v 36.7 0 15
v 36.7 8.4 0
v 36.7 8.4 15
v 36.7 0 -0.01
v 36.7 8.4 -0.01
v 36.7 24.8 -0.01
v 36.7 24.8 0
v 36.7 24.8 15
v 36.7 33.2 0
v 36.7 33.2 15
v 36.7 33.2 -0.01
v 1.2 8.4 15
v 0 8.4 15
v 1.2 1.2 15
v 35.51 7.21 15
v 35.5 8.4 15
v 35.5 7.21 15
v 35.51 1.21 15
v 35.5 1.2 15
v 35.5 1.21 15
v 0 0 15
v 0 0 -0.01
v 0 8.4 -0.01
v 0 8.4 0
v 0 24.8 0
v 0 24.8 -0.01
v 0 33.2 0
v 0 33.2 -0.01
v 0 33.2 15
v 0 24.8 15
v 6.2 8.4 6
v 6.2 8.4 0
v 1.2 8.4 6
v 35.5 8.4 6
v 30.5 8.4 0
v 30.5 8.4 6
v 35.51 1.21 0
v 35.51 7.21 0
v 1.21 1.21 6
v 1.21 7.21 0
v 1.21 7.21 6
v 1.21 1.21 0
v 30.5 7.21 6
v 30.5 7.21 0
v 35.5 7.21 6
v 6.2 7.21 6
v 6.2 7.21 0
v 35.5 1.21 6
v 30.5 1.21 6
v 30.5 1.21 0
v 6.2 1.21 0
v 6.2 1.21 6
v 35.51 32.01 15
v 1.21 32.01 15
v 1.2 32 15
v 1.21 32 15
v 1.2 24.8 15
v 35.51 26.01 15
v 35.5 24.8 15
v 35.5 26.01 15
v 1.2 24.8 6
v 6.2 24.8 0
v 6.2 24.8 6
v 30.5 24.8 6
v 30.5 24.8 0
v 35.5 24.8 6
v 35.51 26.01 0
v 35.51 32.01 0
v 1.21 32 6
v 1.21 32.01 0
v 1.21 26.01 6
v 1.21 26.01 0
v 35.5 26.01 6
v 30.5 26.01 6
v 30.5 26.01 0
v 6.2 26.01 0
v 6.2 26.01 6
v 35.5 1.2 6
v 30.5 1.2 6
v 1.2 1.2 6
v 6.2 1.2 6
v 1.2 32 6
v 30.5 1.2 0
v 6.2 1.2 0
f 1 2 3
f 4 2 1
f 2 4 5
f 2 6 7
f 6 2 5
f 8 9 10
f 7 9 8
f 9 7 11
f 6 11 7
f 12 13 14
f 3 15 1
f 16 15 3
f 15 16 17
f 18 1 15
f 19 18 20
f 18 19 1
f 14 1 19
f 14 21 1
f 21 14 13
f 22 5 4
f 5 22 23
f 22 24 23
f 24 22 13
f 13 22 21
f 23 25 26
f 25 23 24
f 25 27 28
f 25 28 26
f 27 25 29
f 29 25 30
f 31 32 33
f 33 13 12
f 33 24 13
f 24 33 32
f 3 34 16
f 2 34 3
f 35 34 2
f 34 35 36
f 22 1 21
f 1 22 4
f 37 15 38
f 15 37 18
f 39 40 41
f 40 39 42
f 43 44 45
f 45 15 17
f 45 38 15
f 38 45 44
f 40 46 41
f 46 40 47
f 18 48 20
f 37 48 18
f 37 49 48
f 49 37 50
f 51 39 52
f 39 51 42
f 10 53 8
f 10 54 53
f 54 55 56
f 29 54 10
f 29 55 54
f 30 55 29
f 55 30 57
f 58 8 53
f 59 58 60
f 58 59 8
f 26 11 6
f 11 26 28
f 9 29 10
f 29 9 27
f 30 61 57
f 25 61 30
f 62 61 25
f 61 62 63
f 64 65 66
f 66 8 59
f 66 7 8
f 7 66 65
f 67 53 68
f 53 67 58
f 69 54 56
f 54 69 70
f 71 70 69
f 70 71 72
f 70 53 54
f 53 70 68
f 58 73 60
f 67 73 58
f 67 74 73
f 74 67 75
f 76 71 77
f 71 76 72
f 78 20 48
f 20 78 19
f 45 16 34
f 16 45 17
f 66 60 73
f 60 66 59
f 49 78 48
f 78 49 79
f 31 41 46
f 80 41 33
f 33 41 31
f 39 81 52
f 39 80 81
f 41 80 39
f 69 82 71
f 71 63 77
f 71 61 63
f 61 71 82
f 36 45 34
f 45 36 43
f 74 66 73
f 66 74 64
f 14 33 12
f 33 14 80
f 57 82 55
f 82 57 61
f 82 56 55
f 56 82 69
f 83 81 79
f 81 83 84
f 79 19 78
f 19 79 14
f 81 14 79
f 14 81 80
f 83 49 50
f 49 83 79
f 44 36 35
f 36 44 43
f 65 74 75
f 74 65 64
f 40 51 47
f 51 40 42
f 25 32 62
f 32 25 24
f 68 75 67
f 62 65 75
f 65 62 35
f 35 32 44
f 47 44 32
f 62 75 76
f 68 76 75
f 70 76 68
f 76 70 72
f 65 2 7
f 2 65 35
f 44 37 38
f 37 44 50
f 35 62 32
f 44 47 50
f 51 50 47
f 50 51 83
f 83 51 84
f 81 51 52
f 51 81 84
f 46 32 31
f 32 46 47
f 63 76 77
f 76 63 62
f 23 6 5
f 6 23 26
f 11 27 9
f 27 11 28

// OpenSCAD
// file: ../Base/Rotation.scad
// Fischertechnik Box Foundation
// Geometry Helpers Rotation

include <PlacementOptions.scad>

// getRotatedSpace(space, rotation=NoRotation)
// Rotates the space dependent on the specified rotation

function getRotatedSpace(space, rotation=NoRotation) = [
    (rotation == Rotate90 || rotation == Rotate270) ? space.y : space.x,
    (rotation == Rotate90 || rotation == Rotate270) ? space.x : space.y
];

// Rotates the given space around the fixed left lower corner
// space = the space the children needs as width/depth list [width,depth]
// rotation = 0 Rotate0 degrees, 1 Rotate90 degrees, 2 Rotate180 degrees, 3 Rotate270 degrees (equivalent to -90)

module RotateFix(space, rotation=NoRotation) {
    dy = (rotation == Rotate0 || rotation == Rotate270) ? 0 :
        (rotation == Rotate90) ? space.x :
        space.y;
    dx = (rotation < Rotate180) ? 0 :
        (rotation == Rotate180) ? space.x :
        space.y;
    
    translate([dx, dy, 0])
        rotate([0, 0, rotations[rotation]])
            children();
}
// file: ../Base/Alignment.scad
// Fischertechnik Box Foundation
// Geometry Helpers Alignment

include <PlacementOptions.scad>

// getAlignedX(elementWidth, spaceWidth, align=AlignRight, offset=0)
// Gets the aligned X offset of an element with the given
// width in the given space.
// elementWidth = The width of the element to positon
// spaceWidth = The space where the element should be aligned
// align = 0 AlignLeft, 1 AlignCenter, 2 AlignRight
// offset = an optional offset from the aligned position. When
// aligned left or centered, then positive values are in X direction.
// When aligned right then positive values are in negative X direction.

function getAlignedX(elementWidth, spaceWidth, align=AlignRight, offset=0) =
    (align == AlignLeft) ?
        offset :
        ((align == AlignCenter) ?
        (spaceWidth - elementWidth)/2 + offset :
        spaceWidth - offset - elementWidth);

// getAlignedY(elementDepth, spaceDepth, align=AlignTop, offset=0)
// Gets the aligned Y offset of an element with the given
// depth in the given space.
// elementDepth = The depth of the element to positon
// spaceDepth = The space where the element should be aligned
// align = 0 AlignBottom, 1 AlignCenter, 2 AlignTop
// offset = an optional offset from the aligned position. When
// aligned bottom or centered, then positive values are in Y direction.
// When aligned top then positive values are in negative Y direction.

function getAlignedY(elementDepth, spaceDepth, align=AlignTop, offset=0) =
    (align == AlignBottom) ?
        offset :
        ((align == AlignCenter) ?
        (spaceDepth - elementDepth)/2 + offset :
        spaceDepth - offset - elementDepth);
// file: ../Base/PlacementOptions.scad
// Fischertechnik Box Foundation
// Placement Options

// Alignment
NoAlign = 0;
AlignLeft = 1;
AlignBottom = 2;
AlignCenter = 3;
AlignRight = 4;
AlignTop = 5;

// Element rotation degree steps
rotations = [0, -90, -180, -270];

// Rotation
NoRotation = 0;
Rotate0 = 0;
Rotate90 = 1;
Rotate180 = 2;
Rotate270 = 3;

// Docking (seen from above)
NoDock = -1;
DockLeft = 0;
DockTop = 1;
DockRight = 2;
DockCorner = 2;
DockBottom = 3;

// Web corners
LowerLeft = 0;
UpperLeft = 1;
UpperRight = 2;
LowerRight = 3;

// Web position relative to corner
LeftOfCorner = 0;
RightOfCorner = 1;
// file: ../Base/Boxes.scad
// Fischertechnik Box Foundation
// Pre-designed Boxes

use <Constants.scad>

include <PlacementOptions.scad>

box190Width = 190;
box190Depth = 130;
box130Width = 130;
box130Depth = 95;

// Values are from an original ec3 box
topBottomDifference = 1.5;
outerHeight = 40;
baseThickness = 1.8;
innerHeight = outerHeight - baseThickness;
stackExcess = 5.7;
radius = 3.5;
wallThickness = 1.5;
tolerance = 0.2;

boxWallThickness = wallThickness;
boxBaseThickness = baseThickness;
boxWebWidth = 3.0;

// getBoxWallThickness()
// Gets the wall thickness of a Fischertechnik Box
function getBoxWallThickness() = boxWallThickness;

// getBoxUsageHeight(height = 38.2)
// Gets the usable height of a Fischertechnik box
// height = Outer height of the box from the bottom to the upper edge.
function getBoxUsageHeight(height = outerHeight) = height - baseThickness - stackExcess;

// getBoxInnerHeight()
// Gets the inner height of a Fischertechnik box, including the stack excess
function getBoxInnerHeight() = innerHeight;

// getBoxBaseThickness()
// Gets the thickness of the Fischertechnik box base.
function getBoxBaseThickness() = boxBaseThickness;

// getBoxWebWidth()
// Gets the width of a box web
function getBoxWebWidth() = boxWebWidth;

// getBox190Space()
// Gets the usable inner space of a Box 190 as an x/y-list
function getBox190Space() = [
    box190Width - 2*getBoxWallThickness() - topBottomDifference, 
    box190Depth - 2*getBoxWallThickness() - topBottomDifference ];

// RoundedCornerPlate(width, depth, height, radius)
// Creates a body plate with rounded corners for a box. Used
// also to create the complete box with the hull module.
// width = Width of the plate
// depth = depth of the plate 
// height = thickness of the plate
// radius = radius of the rounded corner
module RoundedCornerPlate(width, depth, height, radius) {
    translate([radius, radius])
    hull() {
        w = width-2*radius;
        d = depth-2*radius;
        cube([w, d, height]);
        cylinder(height, r=radius, $fn=getFragments());
        translate([w, 0])
            cylinder(height, r=radius, $fn=getFragments());
        translate([w, d])
            cylinder(height, r=radius, $fn=getFragments());
        translate([0, d])
            cylinder(height, r=radius, $fn=getFragments());
    }
}

// BoxBase(width, depth)
// Creates an empty stackable Fischertechnik compatible box
// width = Outer width of the box (190, 130, ...)
// depth = Outer depth of the box (130, 95, ...)

module BoxBase(width, depth, height=outerHeight) {    
    thinPlate = 0.01;

    innerHeight = height - baseThickness;    
    
    module Body(tolerance=tolerance) {
        hull() {
            // Bottom with tolerance to fit into the original boxes when stacked
            translate([-wallThickness+tolerance, -wallThickness+tolerance, -baseThickness])
                RoundedCornerPlate(width-topBottomDifference-2*tolerance, depth-topBottomDifference-2*tolerance, thinPlate, radius);
            
            // Top
            translate([-wallThickness-topBottomDifference/2, -wallThickness-topBottomDifference/2, innerHeight-thinPlate])
                RoundedCornerPlate(width, depth, thinPlate, radius);
         }
    }

    module Cutoff() {
        hull() {
            coWidth = width - 2*wallThickness;
            coDepth = depth - 2*wallThickness;
            
            // Bottom
            RoundedCornerPlate(coWidth-topBottomDifference, coDepth-topBottomDifference, thinPlate, radius);

            // Top
            translate([-topBottomDifference/2, -topBottomDifference/2, innerHeight+thinPlate]) 
                RoundedCornerPlate(coWidth, coDepth, thinPlate, radius);
        }
    }
    
    difference() {        
        Body();
        Cutoff();
        stackOffset = innerHeight - stackExcess;
        translate([0, 0, stackOffset + baseThickness])
            Body(tolerance=0);
    }
}

// Creates the Fischertechnik empty box 130x190 mm and places it at position 0,0
// 190x130 are the outer sizes, the inner space is slightly smaller. Use getBox190Space() to get the inner sizes.
// The box is positioned that the usable inner space is at the 0,0,0 position.

module Box190() {
    BoxBase(box190Width, box190Depth);
}

// Gets the usable inner space of a Box 130 as an x/y-list
function getBox130Space() = [
    box130Width - 2*getBoxWallThickness() - topBottomDifference, 
    box130Depth - 2*getBoxWallThickness() - topBottomDifference ];

// Creates the Fischertechnik empty box 95x130 mm and places it at position 0,0
// 190x130 are the outer sizes, the inner space is slightly smaller. Use getBox190Space() to get the inner sizes.
// The box is positioned that the usable inner space is at the 0,0,0 position.

module Box130() {
    BoxBase(box130Width, box130Depth);
}

// Creates a web at the specified box walls
// corner 0 = LowerLeft, 1 = UpperLeft, 2 = UpperRight, 3 = LowerRight
// side 0 = LeftOfCorner, 1 = RightOfCorner
// distance = Distance in mm from the corner
// boxSpace = inner width and depth of the box (default: Box 190)
// webWidth = length of the web (default is 3 mms)
// webThickness = thickness of the web (default is 1 mm)
// height = Height of the web (standard is getBoxUsageHeight())
// sink = How much of the web is sunk into the wall

module BoxWeb(
    corner, 
    side, 
    distance, 
    boxSpace=getBox190Space(), 
    webWidth=getBoxWebWidth(), 
    webThickness=1.0, 
    height=getBoxUsageHeight(),
    sink = getBoxWallThickness()/2) {
    width = (corner % 2 == 0) ? 
            (side == LeftOfCorner ? webWidth : webThickness) :
            (side == LeftOfCorner ? webThickness : webWidth);

    depth = (corner % 2 == 0) ? 
            (side == RightOfCorner ? webWidth : webThickness) :
            (side == RightOfCorner ? webThickness : webWidth);
    
    xDiff = corner == LowerLeft ? 
                (side == LeftOfCorner ? -sink : distance) :
            (corner == UpperLeft ?                
                (side == LeftOfCorner ? distance : -sink) :
            (corner == UpperRight ?
                (side == LeftOfCorner ? boxSpace.x-webWidth+sink : boxSpace.x-distance-webThickness) :
                (side == LeftOfCorner ? boxSpace.x-distance-webThickness: boxSpace.x-webWidth+sink)));

    yDiff = corner == LowerLeft ? 
                (side == RightOfCorner ? -sink : distance) :
            (corner == UpperLeft ?
                (side == RightOfCorner ? boxSpace.y-distance-webThickness : boxSpace.y-webWidth+sink) :
            (corner == UpperRight ?
                (side == RightOfCorner ? boxSpace.y-webWidth+sink : boxSpace.y-distance-webThickness) :
                (side == RightOfCorner ? distance : -sink)));
    
    translate([xDiff, yDiff, -getExcess()])
        cube([width, depth, height + 2*getExcess()]);
}
// file: ../Base/Placement.scad
// Fischertechnik Box Foundation
// Geometry Helpers Placement

use <Constants.scad>
use <Alignment.scad>
use <Rotation.scad>
use <Boxes.scad>

include <PlacementOptions.scad>

// Place(x=0, y=0, elementSpace=[0,0], alignX=AlignLeft, alignY=AlignBottom, rotation=Rotate0, boxSpace=getBox190Space())
// Places the child at the specified position
// y = Y-Position. This is a relative position when an X aligment is specified.
// x = X-Position. This is a relative position when an Y aligment is specified.
// elementSpace = space of the element to be placed [x,y]
// alignX = -1=NoAlign, 0 AlignLeft, 1 AlignCenter, 3 AlignRight (elementSpace and boxSpace required!)
// alignY = -1=NoAlign, 2 AlignBottom, 1 AlignCenter, 4 AlignTop (elementSpace and boxSpace required!)
// rotation = 0 Rotate0 0 degrees, 1 Rotate90 90 degrees, 
// 2 Rotate180 180 degrees, 3 Rotate270 270 degrees (equivalent to -90)
// boxSpace = Inner space of the box where the placement occurs [x,y] - default is Box 190x130 inner space

module Place(x=0, y=0, elementSpace=[0,0], 
  alignX=AlignLeft, alignY=AlignBottom, 
  rotation=NoRotation, boxSpace=getBox190Space()) {

    module Position(x, y, space, rotation=Rotate0) {
        translate([x, y, 0])
            RotateFix(space, rotation)
                children();
    }

    space = getRotatedSpace(elementSpace, rotation);
    alignedX = getAlignedX(space.x, boxSpace.x, alignX, x);
    alignedY = getAlignedY(space.y, boxSpace.y, alignY, y);
    Position(alignedX, alignedY, elementSpace, rotation)
        children();
}

// Center(space=getBox130Space(), elementSpace=[0,0])
// space = Space where the children is centered. For cylinder use centered=true and no elementSpace.
// elementSpace = space of the element to be centered [x,y]

module Center(space=getBox190Space(), elementSpace=[0,0]) {
    Place(elementSpace=elementSpace, boxSpace=space, alignX=AlignCenter, alignY=AlignCenter)
        children();
}

// CenterHorizontal(width=0, y=0, offset=0, space=getBox130Space())
// width = Width of the element to be placed.
// y = Y position of the element
// offset = Offset from the center position (negative will be left of the center)
// space = Space where the element is placed

module CenterHorizontal(width=0, y=0, offset=0, space=getBox190Space()) {
    Place(x=offset, y=y, elementSpace=[width, 0], boxSpace=space, alignX=AlignCenter)
        children(0);
}

// CenterVertical(depth=0, x=0, offset=0, space=getBox130Space())
// depth = Depth of the element to be placed.
// x = X position of the element
// offset = Offset from the center position (negative will be down of the center)
// space = Space where the element is placed

module CenterVertical(depth=0, x=0, offset=0, space=getBox190Space()) {
    Place(x=x, y=offset, elementSpace=[0, depth], boxSpace=space, alignY=AlignCenter)
        children(0);
}

// getIsVertical(align)
// True if the specified alignment needs a vertical orientation for a divider (AlignRight, AlignLeft)

function getIsVertical(align) = (align == AlignRight || align == AlignLeft);

// getIsHorizontal(align)
// True if the specified alignment needs a horizontal orientation for a divider (AlignTop, AlignBottom)

function getIsHorizontal(align) = (align == AlignTop || align == AlignBottom);
// file: ../Base/Constants.scad
// Fischertechnik Box Foundation
// Constants

// Constant values necessary for multiple elements

// Base constants
dividerThickness = 1.2;
excess = 0.01;
fragments = 90;
tolerance = 0.8;

// Gets the thickness of a divider 
function getDividerThickness() = dividerThickness;

// Gets the excess that is used to merge walls into each other
function getExcess() = excess;

// Gets amount of fragments of a cylinder
function getFragments() = fragments;

// Gets the inner tolerance of a frame to each side
function getTolerance() = tolerance;


// Fischertechnik specific constants
axisDiameter = 4;
axisBottomDiameter = axisDiameter + 1;
axisTolerance = 0.2;

// Gets axis diameter of Fischertechnik axis
function getAxisDiameter() = axisDiameter;

// Gets axis diameter tolerance (subtracted for element axis)
function getAxisTolerance() = axisTolerance;

// Gets the axis diameter for standing axis
function getStandAxisDiameter() = getAxisDiameter() - getAxisTolerance();

// Gets axis bottom diameter for thicker part at the bottom
function getAxisBottomDiameter() = axisBottomDiameter;

pinHeight = 2.5;

// gets the height of a connecting pin
function getPinHeight() = pinHeight;

standardEdgeDistance = 2.5;
standardWebDistance = 11.5;
standardCornerLength = 15;

// gets the standard distance to the wall of the box for dockable frames with webs
function getStandardEdgeDistance() = standardEdgeDistance;

// gets the standard distance of each web to the corner of the dockable frame
function getStandardWebDistance() = standardWebDistance;

// gets the standard length of the corner walls of a dockable frame
function getStandardCornerLength() = standardCornerLength;

tubeWallFactor = 0.8;

// gets the wall thickness of a tube.
function getTubeWallThickness() = tubeWallFactor * getDividerThickness();

smallPartsFrameHeight = 20;

// gets the frame height for docked small parts boxes.
function getSmallPartsFrameHeight() = smallPartsFrameHeight;

hubRingDiameter = 19.5;
hubRingLevelDiameter = 21;

// gets the diameter of a tube matching the inner ring of a wheel
function getHubRingDiameter() = hubRingDiameter;

// gets the diameter of a hub tube with a thicker diameter
function getHubRingLevelDiameter() = hubRingLevelDiameter;
// main file
// Fischertechnik Box Library
// Frame for Lenses
// 31365, 31366, 31367 

use <../ModelBase/Simple.scad>
use <../ModelBase/Complex.scad>

/* [Hidden] */
width = 33.5;
depth = 30;
height = 9.0;

// getFrameLensSpace()
// Gets the outer space the lens frame needs.

function getFrameLensSpace() = getFrameOuterVolume([width, depth, height]);

// FrameLens()
// Frame for 30 mm flat lenses.

module FrameLens() {
    FrameSpecialFlat([width, depth, height]);
}

// Tests
color("lightgray") {
    FrameLens();
}
